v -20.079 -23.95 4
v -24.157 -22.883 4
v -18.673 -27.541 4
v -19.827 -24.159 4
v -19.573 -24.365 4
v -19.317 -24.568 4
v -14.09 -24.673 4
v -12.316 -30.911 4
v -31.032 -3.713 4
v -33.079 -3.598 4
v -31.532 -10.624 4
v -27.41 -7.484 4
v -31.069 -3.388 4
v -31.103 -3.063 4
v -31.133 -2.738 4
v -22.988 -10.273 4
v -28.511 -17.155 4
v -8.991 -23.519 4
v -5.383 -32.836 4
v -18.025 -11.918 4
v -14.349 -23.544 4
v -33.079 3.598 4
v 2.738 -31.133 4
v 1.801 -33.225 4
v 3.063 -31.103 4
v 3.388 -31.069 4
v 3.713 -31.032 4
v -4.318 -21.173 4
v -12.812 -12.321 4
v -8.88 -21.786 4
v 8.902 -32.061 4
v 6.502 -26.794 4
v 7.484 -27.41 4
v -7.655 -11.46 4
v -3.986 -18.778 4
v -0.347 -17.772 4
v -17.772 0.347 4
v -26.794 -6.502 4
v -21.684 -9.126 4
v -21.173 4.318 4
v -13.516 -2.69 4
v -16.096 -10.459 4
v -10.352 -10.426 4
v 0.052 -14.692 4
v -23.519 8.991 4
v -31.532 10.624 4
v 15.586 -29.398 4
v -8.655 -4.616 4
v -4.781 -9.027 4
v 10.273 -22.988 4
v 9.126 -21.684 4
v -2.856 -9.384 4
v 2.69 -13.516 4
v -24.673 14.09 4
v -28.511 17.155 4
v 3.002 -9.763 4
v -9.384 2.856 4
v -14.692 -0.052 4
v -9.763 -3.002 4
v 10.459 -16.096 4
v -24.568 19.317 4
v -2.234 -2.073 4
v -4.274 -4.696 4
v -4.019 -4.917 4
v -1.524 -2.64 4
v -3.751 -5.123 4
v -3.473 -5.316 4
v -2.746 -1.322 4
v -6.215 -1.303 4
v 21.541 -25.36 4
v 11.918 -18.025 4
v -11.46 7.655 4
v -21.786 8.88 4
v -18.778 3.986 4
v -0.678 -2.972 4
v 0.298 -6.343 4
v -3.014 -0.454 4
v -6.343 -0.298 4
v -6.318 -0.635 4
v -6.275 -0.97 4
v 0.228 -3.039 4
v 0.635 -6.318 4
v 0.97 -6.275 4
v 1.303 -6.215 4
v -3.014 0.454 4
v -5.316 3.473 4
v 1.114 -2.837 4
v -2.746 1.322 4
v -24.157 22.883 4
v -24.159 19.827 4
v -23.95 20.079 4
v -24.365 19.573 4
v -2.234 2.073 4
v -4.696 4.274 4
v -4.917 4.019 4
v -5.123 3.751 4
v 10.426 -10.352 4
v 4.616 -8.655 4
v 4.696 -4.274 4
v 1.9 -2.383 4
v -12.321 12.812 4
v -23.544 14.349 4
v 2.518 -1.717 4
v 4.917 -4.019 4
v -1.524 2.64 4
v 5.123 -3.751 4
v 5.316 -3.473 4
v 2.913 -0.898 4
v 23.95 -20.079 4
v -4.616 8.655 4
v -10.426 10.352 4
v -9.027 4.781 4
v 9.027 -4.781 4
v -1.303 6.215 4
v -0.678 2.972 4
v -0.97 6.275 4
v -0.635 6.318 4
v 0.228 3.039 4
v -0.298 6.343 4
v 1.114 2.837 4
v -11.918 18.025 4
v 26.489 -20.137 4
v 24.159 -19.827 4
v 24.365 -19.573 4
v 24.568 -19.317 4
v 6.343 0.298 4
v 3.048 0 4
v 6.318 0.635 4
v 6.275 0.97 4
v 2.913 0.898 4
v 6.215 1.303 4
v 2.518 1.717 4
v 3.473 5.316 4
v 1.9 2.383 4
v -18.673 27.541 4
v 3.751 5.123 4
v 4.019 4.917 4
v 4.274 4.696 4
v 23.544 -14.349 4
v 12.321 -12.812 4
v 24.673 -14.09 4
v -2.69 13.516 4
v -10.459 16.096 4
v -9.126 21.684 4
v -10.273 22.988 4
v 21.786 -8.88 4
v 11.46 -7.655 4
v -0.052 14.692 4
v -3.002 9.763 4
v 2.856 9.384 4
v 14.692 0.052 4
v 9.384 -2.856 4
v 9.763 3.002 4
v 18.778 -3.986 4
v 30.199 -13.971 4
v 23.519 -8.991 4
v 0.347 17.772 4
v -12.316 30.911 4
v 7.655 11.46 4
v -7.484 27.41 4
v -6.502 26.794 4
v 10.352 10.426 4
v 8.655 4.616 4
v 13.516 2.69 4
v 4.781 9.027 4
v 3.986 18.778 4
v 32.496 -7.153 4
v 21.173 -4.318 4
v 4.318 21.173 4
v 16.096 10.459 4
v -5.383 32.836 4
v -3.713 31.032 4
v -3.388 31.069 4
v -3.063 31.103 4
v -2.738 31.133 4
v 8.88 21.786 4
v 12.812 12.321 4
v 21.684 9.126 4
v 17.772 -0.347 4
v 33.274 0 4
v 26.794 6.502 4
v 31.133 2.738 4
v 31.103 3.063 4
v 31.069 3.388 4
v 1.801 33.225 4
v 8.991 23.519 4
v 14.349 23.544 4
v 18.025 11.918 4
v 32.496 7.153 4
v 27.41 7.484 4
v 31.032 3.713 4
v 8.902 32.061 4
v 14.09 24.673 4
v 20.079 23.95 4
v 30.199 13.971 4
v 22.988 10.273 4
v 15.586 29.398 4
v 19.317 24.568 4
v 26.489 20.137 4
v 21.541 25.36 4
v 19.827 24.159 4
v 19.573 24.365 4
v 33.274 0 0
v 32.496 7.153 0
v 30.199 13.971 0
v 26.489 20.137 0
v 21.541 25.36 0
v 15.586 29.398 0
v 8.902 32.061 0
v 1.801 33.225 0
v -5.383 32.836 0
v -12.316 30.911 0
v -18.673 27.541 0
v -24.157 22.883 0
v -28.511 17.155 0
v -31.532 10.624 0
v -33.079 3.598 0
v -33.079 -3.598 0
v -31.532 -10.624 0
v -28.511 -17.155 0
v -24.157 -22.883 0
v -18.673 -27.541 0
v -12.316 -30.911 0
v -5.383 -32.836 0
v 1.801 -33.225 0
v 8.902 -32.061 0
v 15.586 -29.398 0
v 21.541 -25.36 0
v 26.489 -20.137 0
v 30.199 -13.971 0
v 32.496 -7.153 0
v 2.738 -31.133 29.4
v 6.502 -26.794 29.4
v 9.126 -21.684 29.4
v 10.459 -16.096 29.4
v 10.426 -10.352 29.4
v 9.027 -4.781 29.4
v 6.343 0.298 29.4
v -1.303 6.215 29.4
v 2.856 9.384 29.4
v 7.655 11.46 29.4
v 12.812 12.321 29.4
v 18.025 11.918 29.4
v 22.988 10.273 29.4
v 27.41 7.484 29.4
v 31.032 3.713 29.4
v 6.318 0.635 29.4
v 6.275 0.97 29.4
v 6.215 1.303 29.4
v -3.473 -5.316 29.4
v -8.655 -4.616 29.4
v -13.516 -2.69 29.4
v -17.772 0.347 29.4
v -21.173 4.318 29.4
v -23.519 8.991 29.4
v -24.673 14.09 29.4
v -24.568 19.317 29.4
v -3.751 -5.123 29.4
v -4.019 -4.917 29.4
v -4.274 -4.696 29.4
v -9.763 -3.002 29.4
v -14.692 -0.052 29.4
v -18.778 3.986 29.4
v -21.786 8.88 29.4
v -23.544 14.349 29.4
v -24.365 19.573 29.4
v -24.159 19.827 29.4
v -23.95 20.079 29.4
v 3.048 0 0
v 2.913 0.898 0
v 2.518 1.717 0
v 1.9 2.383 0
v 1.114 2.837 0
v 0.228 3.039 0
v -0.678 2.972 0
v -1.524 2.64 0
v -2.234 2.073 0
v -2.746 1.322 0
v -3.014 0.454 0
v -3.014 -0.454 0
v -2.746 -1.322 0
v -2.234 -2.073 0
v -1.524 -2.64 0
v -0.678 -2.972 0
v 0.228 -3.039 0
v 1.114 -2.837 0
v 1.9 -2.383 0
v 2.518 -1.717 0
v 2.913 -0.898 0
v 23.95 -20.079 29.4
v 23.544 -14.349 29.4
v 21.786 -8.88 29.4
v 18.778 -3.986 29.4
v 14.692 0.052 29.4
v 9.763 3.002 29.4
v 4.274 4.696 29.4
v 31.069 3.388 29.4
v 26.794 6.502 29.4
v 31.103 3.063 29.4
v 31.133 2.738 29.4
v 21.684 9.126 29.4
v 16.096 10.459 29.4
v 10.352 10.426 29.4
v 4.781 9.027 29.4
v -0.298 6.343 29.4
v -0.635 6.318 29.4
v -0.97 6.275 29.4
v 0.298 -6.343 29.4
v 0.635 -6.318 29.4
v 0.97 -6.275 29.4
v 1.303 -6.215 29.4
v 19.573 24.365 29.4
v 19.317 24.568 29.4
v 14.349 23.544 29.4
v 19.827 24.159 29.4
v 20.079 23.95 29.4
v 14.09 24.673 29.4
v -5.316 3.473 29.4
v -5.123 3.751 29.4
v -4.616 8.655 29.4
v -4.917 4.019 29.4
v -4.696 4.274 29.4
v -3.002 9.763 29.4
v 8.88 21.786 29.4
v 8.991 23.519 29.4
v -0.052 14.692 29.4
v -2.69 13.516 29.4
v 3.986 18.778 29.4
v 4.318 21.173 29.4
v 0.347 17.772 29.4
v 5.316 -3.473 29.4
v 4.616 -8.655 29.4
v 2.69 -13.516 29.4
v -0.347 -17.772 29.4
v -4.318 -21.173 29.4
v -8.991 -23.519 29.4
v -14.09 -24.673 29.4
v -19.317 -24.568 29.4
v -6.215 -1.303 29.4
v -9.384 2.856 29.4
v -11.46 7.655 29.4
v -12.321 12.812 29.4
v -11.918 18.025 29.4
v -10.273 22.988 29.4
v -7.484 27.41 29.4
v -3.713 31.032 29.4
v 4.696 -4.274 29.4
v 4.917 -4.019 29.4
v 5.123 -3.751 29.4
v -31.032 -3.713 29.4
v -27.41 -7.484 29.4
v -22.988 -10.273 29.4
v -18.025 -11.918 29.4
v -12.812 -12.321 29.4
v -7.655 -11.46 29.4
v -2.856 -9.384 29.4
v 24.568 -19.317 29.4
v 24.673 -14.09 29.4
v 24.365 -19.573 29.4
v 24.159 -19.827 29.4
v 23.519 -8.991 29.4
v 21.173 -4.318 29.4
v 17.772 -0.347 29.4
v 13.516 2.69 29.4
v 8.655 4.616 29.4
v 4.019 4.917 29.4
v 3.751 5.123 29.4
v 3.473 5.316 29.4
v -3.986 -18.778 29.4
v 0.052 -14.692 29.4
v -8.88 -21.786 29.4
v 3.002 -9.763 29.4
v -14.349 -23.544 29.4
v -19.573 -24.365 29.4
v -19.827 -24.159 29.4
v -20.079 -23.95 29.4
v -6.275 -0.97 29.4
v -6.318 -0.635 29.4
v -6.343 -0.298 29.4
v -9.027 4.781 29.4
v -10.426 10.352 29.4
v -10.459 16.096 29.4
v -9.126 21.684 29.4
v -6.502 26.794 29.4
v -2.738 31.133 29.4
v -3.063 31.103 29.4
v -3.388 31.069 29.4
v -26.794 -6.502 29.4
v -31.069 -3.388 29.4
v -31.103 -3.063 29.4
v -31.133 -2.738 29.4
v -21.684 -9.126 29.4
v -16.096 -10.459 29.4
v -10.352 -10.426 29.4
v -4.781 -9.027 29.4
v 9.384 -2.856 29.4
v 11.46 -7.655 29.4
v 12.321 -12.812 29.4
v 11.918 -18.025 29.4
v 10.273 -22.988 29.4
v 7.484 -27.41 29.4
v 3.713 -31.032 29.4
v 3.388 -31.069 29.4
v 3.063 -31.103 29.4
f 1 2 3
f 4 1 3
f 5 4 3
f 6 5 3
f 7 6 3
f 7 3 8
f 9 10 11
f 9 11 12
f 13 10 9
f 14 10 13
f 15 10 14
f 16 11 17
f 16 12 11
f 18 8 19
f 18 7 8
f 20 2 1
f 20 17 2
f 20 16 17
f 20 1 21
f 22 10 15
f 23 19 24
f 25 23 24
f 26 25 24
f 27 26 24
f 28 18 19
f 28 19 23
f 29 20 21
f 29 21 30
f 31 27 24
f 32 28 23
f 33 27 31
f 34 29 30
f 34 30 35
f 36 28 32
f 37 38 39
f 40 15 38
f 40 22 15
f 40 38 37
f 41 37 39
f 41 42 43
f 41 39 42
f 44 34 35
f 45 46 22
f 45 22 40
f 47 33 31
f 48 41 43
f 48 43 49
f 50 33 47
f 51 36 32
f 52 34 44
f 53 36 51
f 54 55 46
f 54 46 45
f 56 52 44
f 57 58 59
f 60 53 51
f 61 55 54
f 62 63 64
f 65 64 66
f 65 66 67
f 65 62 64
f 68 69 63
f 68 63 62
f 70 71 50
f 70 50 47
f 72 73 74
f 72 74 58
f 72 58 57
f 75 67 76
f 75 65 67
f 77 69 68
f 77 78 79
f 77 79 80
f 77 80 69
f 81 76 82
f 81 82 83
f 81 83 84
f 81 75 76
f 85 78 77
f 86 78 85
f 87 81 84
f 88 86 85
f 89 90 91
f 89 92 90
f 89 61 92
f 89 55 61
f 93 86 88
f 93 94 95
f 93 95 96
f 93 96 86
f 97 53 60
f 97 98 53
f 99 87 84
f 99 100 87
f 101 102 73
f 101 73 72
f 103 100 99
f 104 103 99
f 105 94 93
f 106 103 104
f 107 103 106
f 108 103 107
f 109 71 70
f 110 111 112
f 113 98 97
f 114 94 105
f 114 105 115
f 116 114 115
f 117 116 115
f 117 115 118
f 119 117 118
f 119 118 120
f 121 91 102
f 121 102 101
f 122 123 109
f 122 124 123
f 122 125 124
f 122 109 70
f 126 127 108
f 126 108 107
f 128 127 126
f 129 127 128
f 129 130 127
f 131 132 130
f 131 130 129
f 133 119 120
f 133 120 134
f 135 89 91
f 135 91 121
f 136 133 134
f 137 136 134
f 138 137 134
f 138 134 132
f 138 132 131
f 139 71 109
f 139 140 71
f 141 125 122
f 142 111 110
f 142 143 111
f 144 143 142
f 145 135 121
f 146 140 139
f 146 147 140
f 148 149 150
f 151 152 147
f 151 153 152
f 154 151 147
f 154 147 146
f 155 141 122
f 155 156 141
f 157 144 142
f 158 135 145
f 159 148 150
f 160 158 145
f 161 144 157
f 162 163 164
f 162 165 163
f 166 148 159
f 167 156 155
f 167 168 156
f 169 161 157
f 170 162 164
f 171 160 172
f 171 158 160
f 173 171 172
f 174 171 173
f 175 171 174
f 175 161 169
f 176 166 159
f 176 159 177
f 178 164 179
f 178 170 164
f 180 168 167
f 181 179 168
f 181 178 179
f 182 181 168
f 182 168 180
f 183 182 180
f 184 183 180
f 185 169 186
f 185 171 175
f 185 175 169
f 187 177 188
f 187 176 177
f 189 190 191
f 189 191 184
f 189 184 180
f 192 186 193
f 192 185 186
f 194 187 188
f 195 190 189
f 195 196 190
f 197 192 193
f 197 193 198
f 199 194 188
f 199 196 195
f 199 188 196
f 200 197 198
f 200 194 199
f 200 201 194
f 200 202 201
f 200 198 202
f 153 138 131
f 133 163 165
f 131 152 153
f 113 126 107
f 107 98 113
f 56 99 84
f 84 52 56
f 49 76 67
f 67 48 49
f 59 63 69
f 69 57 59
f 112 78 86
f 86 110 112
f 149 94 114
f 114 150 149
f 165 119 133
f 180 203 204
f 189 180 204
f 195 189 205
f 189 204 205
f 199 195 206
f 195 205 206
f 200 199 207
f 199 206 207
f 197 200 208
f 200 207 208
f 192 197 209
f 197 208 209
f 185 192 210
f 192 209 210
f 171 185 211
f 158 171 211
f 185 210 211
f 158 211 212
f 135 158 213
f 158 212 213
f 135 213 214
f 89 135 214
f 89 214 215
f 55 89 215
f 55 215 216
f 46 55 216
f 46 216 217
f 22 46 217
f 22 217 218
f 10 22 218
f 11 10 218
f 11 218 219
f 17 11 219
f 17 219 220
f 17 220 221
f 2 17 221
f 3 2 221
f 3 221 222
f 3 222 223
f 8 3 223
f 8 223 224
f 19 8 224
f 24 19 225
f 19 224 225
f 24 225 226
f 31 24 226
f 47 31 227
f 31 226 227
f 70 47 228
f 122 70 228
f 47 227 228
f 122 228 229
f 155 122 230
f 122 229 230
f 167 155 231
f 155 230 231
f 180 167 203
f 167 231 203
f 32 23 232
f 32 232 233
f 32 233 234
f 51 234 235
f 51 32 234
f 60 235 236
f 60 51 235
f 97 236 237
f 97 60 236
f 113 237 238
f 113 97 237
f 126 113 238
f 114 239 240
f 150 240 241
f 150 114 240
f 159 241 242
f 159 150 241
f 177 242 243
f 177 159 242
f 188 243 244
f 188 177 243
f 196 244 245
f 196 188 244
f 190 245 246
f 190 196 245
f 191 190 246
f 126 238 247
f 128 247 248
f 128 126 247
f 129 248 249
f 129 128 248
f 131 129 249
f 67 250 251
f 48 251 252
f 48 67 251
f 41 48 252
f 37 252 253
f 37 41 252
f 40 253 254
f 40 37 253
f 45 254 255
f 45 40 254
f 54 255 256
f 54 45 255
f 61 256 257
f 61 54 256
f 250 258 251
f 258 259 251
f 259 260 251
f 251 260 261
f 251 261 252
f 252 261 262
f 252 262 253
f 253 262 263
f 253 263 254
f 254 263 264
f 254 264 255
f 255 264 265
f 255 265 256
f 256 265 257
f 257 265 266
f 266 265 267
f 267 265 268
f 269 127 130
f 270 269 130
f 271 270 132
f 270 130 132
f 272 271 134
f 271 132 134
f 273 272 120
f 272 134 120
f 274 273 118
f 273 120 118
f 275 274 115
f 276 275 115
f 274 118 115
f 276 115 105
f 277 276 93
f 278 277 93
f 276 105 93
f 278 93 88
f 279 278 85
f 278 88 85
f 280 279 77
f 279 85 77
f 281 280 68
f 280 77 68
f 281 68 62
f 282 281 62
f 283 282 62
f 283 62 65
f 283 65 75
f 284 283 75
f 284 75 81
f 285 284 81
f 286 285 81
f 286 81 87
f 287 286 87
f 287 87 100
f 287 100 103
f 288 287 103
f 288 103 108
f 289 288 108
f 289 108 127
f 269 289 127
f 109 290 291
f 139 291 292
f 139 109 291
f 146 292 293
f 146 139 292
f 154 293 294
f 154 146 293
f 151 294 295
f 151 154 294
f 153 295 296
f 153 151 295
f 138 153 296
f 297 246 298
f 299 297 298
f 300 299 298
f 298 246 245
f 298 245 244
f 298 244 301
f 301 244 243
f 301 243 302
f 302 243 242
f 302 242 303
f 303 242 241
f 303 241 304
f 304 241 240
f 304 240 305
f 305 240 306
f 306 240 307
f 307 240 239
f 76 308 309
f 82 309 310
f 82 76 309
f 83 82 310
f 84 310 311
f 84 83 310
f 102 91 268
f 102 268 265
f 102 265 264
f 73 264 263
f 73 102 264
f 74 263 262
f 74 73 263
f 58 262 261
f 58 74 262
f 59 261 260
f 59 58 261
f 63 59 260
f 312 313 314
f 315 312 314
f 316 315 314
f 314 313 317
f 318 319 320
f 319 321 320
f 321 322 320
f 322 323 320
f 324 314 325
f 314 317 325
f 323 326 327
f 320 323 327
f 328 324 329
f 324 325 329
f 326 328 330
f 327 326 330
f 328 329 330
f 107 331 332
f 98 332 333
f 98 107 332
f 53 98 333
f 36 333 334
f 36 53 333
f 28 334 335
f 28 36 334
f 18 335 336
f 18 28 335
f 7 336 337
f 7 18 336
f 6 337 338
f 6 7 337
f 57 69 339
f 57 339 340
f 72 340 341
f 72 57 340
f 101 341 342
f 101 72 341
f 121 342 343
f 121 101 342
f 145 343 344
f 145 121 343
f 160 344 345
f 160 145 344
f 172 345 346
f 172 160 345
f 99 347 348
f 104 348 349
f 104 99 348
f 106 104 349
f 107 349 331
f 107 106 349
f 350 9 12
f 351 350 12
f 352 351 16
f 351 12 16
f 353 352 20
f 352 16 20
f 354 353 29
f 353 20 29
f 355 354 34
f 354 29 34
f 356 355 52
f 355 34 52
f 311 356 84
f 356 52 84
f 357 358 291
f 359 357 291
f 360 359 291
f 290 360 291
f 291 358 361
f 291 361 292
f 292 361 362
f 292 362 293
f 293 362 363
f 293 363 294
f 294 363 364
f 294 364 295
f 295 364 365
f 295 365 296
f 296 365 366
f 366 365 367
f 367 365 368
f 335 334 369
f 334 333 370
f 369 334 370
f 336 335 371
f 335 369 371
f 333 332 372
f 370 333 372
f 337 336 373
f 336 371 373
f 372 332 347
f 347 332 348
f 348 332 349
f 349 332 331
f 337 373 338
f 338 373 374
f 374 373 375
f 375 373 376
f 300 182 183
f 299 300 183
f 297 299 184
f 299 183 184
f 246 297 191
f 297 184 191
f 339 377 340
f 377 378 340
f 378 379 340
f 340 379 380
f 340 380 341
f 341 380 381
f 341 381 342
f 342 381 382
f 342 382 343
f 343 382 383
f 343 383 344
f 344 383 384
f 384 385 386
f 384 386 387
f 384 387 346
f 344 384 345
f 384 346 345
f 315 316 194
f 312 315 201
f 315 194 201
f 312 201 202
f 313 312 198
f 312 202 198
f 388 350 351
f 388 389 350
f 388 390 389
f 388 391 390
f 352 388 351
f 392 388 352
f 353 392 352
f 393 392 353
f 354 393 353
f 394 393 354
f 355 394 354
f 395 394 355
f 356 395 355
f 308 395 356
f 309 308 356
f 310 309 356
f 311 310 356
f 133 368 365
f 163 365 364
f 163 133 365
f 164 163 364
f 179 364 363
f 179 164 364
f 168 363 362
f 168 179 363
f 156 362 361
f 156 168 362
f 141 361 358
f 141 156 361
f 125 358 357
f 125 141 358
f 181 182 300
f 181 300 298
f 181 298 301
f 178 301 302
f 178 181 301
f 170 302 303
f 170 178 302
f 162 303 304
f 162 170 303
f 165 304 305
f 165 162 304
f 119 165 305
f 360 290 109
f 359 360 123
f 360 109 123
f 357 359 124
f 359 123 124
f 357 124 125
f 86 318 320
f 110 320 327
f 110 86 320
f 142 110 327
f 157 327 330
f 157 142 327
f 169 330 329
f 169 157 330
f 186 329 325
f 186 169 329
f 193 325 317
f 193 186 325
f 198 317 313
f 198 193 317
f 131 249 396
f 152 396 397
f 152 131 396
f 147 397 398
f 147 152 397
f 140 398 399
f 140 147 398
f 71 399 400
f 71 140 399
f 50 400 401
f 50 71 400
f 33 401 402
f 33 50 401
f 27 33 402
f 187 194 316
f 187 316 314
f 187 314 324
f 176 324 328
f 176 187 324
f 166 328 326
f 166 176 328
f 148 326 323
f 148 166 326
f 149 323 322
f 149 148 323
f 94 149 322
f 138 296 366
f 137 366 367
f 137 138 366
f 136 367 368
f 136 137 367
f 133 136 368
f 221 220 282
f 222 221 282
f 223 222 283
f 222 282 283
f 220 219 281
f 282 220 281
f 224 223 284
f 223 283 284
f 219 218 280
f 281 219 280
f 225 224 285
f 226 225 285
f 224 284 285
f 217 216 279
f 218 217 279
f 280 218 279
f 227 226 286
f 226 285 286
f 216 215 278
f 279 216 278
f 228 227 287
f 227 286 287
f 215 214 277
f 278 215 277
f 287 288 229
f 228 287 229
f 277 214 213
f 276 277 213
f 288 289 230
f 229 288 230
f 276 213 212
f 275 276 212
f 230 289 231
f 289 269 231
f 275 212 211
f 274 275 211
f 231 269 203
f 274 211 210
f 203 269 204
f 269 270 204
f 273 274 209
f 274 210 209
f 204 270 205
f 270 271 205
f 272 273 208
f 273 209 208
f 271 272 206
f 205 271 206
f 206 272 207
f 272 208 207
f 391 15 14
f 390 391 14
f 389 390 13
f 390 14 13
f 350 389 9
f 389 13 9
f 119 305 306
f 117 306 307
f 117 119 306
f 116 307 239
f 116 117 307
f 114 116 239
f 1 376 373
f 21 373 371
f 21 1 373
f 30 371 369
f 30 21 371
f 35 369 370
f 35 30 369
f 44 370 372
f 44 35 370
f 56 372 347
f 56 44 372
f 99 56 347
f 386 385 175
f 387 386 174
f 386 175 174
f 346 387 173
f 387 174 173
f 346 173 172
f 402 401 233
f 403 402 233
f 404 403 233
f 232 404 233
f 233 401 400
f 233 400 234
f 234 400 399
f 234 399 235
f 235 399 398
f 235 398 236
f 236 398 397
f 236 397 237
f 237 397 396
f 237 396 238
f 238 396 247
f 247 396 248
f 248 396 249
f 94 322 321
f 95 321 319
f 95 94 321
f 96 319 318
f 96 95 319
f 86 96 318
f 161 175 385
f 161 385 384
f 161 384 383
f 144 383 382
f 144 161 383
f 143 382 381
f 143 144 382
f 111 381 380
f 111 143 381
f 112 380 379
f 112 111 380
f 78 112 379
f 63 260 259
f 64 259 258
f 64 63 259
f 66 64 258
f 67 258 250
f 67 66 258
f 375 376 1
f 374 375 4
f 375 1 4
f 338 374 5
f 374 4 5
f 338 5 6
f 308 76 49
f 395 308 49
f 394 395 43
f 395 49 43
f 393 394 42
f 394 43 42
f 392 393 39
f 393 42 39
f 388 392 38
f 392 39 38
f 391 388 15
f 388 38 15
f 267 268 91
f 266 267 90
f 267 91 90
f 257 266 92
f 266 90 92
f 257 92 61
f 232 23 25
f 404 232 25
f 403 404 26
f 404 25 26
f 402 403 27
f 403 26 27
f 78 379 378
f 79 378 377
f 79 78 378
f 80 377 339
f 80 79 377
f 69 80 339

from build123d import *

# Parameters (mm, degrees)
SKETCH1_R           = 33.274
BOSS_EXTRUDE1_DEPTH = 4
SKETCH2_R           = 3.048
CUT_EXTRUDE1_DEPTH  = 5
BOSS_EXTRUDE2_DEPTH = 25.4
SKETCH4_R           = 6.35
CUT_EXTRUDE2_DEPTH  = 56.896
SKETCH5_R           = 33.274
SKETCH5_R_2         = 31.253208268
CUT_EXTRUDE3_DEPTH  = 120.142


with BuildPart() as part:
    # Sketch1 → Boss-Extrude1 (new body)
    with BuildSketch(Plane.XY):
        Circle(SKETCH1_R)
    extrude(amount=BOSS_EXTRUDE1_DEPTH)

    # Sketch2 → Cut-Extrude1 (cut, through all)
    with BuildSketch(Plane.XY.offset(4)):
        Circle(SKETCH2_R)
    extrude(amount=-CUT_EXTRUDE1_DEPTH, mode=Mode.SUBTRACT)

    # Sketch3 → Boss-Extrude2 (add)
    with BuildSketch(Plane.XY.offset(4)):
        with BuildLine():
            ThreePointArc((5.08, 0), (-2.558445785, -19.86901744), (-23.528271037, -23.528271037))
            ThreePointArc((-23.528271037, -23.528271037), (-3.66763311, -18.52034496), (5.08, 0))
        make_face()
        with BuildLine():
            ThreePointArc((3.592102448, -3.592102448), (-15.689269754, -10.502453268), (-33.274, 0))
            ThreePointArc((-33.274, 0), (-15.858611331, -12.240422604), (3.592102448, -3.592102448))
        make_face()
        with BuildLine():
            ThreePointArc((0, -5.08), (-19.86901744, 2.558445785), (-23.528271037, 23.528271037))
            ThreePointArc((-23.528271037, 23.528271037), (-18.52034496, 3.66763311), (0, -5.08))
        make_face()
        with BuildLine():
            ThreePointArc((-3.592102448, -3.592102448), (-12.240422604, 15.858611331), (0, 33.274))
            ThreePointArc((0, 33.274), (-10.502453268, 15.689269754), (-3.592102448, -3.592102448))
        make_face()
        with BuildLine():
            ThreePointArc((-5.08, 0), (2.558445785, 19.86901744), (23.528271037, 23.528271037))
            ThreePointArc((23.528271037, 23.528271037), (3.66763311, 18.52034496), (-5.08, 0))
        make_face()
        with BuildLine():
            ThreePointArc((-3.592102448, 3.592102448), (15.858611331, 12.240422604), (33.274, 0))
            ThreePointArc((33.274, 0), (15.689269754, 10.502453268), (-3.592102448, 3.592102448))
        make_face()
        with BuildLine():
            ThreePointArc((0, 5.08), (19.86901744, -2.558445785), (23.528271037, -23.528271037))
            ThreePointArc((23.528271037, -23.528271037), (18.52034496, -3.66763311), (0, 5.08))
        make_face()
        with BuildLine():
            ThreePointArc((3.592102448, 3.592102448), (12.240422604, -15.858611331), (0, -33.274))
            ThreePointArc((0, -33.274), (10.502453268, -15.689269754), (3.592102448, 3.592102448))
        make_face()
    extrude(amount=BOSS_EXTRUDE2_DEPTH)

    # Sketch4 → Cut-Extrude2 (cut)
    with BuildSketch(Plane.XY.offset(4)):
        Circle(SKETCH4_R)
    extrude(amount=CUT_EXTRUDE2_DEPTH, mode=Mode.SUBTRACT)

    # Sketch5 → Cut-Extrude3 (cut)
    with BuildSketch(Plane.XY.offset(4)):
        Circle(SKETCH5_R)
        Circle(SKETCH5_R_2, mode=Mode.SUBTRACT)
    extrude(amount=CUT_EXTRUDE3_DEPTH, mode=Mode.SUBTRACT)


solid = part.part
